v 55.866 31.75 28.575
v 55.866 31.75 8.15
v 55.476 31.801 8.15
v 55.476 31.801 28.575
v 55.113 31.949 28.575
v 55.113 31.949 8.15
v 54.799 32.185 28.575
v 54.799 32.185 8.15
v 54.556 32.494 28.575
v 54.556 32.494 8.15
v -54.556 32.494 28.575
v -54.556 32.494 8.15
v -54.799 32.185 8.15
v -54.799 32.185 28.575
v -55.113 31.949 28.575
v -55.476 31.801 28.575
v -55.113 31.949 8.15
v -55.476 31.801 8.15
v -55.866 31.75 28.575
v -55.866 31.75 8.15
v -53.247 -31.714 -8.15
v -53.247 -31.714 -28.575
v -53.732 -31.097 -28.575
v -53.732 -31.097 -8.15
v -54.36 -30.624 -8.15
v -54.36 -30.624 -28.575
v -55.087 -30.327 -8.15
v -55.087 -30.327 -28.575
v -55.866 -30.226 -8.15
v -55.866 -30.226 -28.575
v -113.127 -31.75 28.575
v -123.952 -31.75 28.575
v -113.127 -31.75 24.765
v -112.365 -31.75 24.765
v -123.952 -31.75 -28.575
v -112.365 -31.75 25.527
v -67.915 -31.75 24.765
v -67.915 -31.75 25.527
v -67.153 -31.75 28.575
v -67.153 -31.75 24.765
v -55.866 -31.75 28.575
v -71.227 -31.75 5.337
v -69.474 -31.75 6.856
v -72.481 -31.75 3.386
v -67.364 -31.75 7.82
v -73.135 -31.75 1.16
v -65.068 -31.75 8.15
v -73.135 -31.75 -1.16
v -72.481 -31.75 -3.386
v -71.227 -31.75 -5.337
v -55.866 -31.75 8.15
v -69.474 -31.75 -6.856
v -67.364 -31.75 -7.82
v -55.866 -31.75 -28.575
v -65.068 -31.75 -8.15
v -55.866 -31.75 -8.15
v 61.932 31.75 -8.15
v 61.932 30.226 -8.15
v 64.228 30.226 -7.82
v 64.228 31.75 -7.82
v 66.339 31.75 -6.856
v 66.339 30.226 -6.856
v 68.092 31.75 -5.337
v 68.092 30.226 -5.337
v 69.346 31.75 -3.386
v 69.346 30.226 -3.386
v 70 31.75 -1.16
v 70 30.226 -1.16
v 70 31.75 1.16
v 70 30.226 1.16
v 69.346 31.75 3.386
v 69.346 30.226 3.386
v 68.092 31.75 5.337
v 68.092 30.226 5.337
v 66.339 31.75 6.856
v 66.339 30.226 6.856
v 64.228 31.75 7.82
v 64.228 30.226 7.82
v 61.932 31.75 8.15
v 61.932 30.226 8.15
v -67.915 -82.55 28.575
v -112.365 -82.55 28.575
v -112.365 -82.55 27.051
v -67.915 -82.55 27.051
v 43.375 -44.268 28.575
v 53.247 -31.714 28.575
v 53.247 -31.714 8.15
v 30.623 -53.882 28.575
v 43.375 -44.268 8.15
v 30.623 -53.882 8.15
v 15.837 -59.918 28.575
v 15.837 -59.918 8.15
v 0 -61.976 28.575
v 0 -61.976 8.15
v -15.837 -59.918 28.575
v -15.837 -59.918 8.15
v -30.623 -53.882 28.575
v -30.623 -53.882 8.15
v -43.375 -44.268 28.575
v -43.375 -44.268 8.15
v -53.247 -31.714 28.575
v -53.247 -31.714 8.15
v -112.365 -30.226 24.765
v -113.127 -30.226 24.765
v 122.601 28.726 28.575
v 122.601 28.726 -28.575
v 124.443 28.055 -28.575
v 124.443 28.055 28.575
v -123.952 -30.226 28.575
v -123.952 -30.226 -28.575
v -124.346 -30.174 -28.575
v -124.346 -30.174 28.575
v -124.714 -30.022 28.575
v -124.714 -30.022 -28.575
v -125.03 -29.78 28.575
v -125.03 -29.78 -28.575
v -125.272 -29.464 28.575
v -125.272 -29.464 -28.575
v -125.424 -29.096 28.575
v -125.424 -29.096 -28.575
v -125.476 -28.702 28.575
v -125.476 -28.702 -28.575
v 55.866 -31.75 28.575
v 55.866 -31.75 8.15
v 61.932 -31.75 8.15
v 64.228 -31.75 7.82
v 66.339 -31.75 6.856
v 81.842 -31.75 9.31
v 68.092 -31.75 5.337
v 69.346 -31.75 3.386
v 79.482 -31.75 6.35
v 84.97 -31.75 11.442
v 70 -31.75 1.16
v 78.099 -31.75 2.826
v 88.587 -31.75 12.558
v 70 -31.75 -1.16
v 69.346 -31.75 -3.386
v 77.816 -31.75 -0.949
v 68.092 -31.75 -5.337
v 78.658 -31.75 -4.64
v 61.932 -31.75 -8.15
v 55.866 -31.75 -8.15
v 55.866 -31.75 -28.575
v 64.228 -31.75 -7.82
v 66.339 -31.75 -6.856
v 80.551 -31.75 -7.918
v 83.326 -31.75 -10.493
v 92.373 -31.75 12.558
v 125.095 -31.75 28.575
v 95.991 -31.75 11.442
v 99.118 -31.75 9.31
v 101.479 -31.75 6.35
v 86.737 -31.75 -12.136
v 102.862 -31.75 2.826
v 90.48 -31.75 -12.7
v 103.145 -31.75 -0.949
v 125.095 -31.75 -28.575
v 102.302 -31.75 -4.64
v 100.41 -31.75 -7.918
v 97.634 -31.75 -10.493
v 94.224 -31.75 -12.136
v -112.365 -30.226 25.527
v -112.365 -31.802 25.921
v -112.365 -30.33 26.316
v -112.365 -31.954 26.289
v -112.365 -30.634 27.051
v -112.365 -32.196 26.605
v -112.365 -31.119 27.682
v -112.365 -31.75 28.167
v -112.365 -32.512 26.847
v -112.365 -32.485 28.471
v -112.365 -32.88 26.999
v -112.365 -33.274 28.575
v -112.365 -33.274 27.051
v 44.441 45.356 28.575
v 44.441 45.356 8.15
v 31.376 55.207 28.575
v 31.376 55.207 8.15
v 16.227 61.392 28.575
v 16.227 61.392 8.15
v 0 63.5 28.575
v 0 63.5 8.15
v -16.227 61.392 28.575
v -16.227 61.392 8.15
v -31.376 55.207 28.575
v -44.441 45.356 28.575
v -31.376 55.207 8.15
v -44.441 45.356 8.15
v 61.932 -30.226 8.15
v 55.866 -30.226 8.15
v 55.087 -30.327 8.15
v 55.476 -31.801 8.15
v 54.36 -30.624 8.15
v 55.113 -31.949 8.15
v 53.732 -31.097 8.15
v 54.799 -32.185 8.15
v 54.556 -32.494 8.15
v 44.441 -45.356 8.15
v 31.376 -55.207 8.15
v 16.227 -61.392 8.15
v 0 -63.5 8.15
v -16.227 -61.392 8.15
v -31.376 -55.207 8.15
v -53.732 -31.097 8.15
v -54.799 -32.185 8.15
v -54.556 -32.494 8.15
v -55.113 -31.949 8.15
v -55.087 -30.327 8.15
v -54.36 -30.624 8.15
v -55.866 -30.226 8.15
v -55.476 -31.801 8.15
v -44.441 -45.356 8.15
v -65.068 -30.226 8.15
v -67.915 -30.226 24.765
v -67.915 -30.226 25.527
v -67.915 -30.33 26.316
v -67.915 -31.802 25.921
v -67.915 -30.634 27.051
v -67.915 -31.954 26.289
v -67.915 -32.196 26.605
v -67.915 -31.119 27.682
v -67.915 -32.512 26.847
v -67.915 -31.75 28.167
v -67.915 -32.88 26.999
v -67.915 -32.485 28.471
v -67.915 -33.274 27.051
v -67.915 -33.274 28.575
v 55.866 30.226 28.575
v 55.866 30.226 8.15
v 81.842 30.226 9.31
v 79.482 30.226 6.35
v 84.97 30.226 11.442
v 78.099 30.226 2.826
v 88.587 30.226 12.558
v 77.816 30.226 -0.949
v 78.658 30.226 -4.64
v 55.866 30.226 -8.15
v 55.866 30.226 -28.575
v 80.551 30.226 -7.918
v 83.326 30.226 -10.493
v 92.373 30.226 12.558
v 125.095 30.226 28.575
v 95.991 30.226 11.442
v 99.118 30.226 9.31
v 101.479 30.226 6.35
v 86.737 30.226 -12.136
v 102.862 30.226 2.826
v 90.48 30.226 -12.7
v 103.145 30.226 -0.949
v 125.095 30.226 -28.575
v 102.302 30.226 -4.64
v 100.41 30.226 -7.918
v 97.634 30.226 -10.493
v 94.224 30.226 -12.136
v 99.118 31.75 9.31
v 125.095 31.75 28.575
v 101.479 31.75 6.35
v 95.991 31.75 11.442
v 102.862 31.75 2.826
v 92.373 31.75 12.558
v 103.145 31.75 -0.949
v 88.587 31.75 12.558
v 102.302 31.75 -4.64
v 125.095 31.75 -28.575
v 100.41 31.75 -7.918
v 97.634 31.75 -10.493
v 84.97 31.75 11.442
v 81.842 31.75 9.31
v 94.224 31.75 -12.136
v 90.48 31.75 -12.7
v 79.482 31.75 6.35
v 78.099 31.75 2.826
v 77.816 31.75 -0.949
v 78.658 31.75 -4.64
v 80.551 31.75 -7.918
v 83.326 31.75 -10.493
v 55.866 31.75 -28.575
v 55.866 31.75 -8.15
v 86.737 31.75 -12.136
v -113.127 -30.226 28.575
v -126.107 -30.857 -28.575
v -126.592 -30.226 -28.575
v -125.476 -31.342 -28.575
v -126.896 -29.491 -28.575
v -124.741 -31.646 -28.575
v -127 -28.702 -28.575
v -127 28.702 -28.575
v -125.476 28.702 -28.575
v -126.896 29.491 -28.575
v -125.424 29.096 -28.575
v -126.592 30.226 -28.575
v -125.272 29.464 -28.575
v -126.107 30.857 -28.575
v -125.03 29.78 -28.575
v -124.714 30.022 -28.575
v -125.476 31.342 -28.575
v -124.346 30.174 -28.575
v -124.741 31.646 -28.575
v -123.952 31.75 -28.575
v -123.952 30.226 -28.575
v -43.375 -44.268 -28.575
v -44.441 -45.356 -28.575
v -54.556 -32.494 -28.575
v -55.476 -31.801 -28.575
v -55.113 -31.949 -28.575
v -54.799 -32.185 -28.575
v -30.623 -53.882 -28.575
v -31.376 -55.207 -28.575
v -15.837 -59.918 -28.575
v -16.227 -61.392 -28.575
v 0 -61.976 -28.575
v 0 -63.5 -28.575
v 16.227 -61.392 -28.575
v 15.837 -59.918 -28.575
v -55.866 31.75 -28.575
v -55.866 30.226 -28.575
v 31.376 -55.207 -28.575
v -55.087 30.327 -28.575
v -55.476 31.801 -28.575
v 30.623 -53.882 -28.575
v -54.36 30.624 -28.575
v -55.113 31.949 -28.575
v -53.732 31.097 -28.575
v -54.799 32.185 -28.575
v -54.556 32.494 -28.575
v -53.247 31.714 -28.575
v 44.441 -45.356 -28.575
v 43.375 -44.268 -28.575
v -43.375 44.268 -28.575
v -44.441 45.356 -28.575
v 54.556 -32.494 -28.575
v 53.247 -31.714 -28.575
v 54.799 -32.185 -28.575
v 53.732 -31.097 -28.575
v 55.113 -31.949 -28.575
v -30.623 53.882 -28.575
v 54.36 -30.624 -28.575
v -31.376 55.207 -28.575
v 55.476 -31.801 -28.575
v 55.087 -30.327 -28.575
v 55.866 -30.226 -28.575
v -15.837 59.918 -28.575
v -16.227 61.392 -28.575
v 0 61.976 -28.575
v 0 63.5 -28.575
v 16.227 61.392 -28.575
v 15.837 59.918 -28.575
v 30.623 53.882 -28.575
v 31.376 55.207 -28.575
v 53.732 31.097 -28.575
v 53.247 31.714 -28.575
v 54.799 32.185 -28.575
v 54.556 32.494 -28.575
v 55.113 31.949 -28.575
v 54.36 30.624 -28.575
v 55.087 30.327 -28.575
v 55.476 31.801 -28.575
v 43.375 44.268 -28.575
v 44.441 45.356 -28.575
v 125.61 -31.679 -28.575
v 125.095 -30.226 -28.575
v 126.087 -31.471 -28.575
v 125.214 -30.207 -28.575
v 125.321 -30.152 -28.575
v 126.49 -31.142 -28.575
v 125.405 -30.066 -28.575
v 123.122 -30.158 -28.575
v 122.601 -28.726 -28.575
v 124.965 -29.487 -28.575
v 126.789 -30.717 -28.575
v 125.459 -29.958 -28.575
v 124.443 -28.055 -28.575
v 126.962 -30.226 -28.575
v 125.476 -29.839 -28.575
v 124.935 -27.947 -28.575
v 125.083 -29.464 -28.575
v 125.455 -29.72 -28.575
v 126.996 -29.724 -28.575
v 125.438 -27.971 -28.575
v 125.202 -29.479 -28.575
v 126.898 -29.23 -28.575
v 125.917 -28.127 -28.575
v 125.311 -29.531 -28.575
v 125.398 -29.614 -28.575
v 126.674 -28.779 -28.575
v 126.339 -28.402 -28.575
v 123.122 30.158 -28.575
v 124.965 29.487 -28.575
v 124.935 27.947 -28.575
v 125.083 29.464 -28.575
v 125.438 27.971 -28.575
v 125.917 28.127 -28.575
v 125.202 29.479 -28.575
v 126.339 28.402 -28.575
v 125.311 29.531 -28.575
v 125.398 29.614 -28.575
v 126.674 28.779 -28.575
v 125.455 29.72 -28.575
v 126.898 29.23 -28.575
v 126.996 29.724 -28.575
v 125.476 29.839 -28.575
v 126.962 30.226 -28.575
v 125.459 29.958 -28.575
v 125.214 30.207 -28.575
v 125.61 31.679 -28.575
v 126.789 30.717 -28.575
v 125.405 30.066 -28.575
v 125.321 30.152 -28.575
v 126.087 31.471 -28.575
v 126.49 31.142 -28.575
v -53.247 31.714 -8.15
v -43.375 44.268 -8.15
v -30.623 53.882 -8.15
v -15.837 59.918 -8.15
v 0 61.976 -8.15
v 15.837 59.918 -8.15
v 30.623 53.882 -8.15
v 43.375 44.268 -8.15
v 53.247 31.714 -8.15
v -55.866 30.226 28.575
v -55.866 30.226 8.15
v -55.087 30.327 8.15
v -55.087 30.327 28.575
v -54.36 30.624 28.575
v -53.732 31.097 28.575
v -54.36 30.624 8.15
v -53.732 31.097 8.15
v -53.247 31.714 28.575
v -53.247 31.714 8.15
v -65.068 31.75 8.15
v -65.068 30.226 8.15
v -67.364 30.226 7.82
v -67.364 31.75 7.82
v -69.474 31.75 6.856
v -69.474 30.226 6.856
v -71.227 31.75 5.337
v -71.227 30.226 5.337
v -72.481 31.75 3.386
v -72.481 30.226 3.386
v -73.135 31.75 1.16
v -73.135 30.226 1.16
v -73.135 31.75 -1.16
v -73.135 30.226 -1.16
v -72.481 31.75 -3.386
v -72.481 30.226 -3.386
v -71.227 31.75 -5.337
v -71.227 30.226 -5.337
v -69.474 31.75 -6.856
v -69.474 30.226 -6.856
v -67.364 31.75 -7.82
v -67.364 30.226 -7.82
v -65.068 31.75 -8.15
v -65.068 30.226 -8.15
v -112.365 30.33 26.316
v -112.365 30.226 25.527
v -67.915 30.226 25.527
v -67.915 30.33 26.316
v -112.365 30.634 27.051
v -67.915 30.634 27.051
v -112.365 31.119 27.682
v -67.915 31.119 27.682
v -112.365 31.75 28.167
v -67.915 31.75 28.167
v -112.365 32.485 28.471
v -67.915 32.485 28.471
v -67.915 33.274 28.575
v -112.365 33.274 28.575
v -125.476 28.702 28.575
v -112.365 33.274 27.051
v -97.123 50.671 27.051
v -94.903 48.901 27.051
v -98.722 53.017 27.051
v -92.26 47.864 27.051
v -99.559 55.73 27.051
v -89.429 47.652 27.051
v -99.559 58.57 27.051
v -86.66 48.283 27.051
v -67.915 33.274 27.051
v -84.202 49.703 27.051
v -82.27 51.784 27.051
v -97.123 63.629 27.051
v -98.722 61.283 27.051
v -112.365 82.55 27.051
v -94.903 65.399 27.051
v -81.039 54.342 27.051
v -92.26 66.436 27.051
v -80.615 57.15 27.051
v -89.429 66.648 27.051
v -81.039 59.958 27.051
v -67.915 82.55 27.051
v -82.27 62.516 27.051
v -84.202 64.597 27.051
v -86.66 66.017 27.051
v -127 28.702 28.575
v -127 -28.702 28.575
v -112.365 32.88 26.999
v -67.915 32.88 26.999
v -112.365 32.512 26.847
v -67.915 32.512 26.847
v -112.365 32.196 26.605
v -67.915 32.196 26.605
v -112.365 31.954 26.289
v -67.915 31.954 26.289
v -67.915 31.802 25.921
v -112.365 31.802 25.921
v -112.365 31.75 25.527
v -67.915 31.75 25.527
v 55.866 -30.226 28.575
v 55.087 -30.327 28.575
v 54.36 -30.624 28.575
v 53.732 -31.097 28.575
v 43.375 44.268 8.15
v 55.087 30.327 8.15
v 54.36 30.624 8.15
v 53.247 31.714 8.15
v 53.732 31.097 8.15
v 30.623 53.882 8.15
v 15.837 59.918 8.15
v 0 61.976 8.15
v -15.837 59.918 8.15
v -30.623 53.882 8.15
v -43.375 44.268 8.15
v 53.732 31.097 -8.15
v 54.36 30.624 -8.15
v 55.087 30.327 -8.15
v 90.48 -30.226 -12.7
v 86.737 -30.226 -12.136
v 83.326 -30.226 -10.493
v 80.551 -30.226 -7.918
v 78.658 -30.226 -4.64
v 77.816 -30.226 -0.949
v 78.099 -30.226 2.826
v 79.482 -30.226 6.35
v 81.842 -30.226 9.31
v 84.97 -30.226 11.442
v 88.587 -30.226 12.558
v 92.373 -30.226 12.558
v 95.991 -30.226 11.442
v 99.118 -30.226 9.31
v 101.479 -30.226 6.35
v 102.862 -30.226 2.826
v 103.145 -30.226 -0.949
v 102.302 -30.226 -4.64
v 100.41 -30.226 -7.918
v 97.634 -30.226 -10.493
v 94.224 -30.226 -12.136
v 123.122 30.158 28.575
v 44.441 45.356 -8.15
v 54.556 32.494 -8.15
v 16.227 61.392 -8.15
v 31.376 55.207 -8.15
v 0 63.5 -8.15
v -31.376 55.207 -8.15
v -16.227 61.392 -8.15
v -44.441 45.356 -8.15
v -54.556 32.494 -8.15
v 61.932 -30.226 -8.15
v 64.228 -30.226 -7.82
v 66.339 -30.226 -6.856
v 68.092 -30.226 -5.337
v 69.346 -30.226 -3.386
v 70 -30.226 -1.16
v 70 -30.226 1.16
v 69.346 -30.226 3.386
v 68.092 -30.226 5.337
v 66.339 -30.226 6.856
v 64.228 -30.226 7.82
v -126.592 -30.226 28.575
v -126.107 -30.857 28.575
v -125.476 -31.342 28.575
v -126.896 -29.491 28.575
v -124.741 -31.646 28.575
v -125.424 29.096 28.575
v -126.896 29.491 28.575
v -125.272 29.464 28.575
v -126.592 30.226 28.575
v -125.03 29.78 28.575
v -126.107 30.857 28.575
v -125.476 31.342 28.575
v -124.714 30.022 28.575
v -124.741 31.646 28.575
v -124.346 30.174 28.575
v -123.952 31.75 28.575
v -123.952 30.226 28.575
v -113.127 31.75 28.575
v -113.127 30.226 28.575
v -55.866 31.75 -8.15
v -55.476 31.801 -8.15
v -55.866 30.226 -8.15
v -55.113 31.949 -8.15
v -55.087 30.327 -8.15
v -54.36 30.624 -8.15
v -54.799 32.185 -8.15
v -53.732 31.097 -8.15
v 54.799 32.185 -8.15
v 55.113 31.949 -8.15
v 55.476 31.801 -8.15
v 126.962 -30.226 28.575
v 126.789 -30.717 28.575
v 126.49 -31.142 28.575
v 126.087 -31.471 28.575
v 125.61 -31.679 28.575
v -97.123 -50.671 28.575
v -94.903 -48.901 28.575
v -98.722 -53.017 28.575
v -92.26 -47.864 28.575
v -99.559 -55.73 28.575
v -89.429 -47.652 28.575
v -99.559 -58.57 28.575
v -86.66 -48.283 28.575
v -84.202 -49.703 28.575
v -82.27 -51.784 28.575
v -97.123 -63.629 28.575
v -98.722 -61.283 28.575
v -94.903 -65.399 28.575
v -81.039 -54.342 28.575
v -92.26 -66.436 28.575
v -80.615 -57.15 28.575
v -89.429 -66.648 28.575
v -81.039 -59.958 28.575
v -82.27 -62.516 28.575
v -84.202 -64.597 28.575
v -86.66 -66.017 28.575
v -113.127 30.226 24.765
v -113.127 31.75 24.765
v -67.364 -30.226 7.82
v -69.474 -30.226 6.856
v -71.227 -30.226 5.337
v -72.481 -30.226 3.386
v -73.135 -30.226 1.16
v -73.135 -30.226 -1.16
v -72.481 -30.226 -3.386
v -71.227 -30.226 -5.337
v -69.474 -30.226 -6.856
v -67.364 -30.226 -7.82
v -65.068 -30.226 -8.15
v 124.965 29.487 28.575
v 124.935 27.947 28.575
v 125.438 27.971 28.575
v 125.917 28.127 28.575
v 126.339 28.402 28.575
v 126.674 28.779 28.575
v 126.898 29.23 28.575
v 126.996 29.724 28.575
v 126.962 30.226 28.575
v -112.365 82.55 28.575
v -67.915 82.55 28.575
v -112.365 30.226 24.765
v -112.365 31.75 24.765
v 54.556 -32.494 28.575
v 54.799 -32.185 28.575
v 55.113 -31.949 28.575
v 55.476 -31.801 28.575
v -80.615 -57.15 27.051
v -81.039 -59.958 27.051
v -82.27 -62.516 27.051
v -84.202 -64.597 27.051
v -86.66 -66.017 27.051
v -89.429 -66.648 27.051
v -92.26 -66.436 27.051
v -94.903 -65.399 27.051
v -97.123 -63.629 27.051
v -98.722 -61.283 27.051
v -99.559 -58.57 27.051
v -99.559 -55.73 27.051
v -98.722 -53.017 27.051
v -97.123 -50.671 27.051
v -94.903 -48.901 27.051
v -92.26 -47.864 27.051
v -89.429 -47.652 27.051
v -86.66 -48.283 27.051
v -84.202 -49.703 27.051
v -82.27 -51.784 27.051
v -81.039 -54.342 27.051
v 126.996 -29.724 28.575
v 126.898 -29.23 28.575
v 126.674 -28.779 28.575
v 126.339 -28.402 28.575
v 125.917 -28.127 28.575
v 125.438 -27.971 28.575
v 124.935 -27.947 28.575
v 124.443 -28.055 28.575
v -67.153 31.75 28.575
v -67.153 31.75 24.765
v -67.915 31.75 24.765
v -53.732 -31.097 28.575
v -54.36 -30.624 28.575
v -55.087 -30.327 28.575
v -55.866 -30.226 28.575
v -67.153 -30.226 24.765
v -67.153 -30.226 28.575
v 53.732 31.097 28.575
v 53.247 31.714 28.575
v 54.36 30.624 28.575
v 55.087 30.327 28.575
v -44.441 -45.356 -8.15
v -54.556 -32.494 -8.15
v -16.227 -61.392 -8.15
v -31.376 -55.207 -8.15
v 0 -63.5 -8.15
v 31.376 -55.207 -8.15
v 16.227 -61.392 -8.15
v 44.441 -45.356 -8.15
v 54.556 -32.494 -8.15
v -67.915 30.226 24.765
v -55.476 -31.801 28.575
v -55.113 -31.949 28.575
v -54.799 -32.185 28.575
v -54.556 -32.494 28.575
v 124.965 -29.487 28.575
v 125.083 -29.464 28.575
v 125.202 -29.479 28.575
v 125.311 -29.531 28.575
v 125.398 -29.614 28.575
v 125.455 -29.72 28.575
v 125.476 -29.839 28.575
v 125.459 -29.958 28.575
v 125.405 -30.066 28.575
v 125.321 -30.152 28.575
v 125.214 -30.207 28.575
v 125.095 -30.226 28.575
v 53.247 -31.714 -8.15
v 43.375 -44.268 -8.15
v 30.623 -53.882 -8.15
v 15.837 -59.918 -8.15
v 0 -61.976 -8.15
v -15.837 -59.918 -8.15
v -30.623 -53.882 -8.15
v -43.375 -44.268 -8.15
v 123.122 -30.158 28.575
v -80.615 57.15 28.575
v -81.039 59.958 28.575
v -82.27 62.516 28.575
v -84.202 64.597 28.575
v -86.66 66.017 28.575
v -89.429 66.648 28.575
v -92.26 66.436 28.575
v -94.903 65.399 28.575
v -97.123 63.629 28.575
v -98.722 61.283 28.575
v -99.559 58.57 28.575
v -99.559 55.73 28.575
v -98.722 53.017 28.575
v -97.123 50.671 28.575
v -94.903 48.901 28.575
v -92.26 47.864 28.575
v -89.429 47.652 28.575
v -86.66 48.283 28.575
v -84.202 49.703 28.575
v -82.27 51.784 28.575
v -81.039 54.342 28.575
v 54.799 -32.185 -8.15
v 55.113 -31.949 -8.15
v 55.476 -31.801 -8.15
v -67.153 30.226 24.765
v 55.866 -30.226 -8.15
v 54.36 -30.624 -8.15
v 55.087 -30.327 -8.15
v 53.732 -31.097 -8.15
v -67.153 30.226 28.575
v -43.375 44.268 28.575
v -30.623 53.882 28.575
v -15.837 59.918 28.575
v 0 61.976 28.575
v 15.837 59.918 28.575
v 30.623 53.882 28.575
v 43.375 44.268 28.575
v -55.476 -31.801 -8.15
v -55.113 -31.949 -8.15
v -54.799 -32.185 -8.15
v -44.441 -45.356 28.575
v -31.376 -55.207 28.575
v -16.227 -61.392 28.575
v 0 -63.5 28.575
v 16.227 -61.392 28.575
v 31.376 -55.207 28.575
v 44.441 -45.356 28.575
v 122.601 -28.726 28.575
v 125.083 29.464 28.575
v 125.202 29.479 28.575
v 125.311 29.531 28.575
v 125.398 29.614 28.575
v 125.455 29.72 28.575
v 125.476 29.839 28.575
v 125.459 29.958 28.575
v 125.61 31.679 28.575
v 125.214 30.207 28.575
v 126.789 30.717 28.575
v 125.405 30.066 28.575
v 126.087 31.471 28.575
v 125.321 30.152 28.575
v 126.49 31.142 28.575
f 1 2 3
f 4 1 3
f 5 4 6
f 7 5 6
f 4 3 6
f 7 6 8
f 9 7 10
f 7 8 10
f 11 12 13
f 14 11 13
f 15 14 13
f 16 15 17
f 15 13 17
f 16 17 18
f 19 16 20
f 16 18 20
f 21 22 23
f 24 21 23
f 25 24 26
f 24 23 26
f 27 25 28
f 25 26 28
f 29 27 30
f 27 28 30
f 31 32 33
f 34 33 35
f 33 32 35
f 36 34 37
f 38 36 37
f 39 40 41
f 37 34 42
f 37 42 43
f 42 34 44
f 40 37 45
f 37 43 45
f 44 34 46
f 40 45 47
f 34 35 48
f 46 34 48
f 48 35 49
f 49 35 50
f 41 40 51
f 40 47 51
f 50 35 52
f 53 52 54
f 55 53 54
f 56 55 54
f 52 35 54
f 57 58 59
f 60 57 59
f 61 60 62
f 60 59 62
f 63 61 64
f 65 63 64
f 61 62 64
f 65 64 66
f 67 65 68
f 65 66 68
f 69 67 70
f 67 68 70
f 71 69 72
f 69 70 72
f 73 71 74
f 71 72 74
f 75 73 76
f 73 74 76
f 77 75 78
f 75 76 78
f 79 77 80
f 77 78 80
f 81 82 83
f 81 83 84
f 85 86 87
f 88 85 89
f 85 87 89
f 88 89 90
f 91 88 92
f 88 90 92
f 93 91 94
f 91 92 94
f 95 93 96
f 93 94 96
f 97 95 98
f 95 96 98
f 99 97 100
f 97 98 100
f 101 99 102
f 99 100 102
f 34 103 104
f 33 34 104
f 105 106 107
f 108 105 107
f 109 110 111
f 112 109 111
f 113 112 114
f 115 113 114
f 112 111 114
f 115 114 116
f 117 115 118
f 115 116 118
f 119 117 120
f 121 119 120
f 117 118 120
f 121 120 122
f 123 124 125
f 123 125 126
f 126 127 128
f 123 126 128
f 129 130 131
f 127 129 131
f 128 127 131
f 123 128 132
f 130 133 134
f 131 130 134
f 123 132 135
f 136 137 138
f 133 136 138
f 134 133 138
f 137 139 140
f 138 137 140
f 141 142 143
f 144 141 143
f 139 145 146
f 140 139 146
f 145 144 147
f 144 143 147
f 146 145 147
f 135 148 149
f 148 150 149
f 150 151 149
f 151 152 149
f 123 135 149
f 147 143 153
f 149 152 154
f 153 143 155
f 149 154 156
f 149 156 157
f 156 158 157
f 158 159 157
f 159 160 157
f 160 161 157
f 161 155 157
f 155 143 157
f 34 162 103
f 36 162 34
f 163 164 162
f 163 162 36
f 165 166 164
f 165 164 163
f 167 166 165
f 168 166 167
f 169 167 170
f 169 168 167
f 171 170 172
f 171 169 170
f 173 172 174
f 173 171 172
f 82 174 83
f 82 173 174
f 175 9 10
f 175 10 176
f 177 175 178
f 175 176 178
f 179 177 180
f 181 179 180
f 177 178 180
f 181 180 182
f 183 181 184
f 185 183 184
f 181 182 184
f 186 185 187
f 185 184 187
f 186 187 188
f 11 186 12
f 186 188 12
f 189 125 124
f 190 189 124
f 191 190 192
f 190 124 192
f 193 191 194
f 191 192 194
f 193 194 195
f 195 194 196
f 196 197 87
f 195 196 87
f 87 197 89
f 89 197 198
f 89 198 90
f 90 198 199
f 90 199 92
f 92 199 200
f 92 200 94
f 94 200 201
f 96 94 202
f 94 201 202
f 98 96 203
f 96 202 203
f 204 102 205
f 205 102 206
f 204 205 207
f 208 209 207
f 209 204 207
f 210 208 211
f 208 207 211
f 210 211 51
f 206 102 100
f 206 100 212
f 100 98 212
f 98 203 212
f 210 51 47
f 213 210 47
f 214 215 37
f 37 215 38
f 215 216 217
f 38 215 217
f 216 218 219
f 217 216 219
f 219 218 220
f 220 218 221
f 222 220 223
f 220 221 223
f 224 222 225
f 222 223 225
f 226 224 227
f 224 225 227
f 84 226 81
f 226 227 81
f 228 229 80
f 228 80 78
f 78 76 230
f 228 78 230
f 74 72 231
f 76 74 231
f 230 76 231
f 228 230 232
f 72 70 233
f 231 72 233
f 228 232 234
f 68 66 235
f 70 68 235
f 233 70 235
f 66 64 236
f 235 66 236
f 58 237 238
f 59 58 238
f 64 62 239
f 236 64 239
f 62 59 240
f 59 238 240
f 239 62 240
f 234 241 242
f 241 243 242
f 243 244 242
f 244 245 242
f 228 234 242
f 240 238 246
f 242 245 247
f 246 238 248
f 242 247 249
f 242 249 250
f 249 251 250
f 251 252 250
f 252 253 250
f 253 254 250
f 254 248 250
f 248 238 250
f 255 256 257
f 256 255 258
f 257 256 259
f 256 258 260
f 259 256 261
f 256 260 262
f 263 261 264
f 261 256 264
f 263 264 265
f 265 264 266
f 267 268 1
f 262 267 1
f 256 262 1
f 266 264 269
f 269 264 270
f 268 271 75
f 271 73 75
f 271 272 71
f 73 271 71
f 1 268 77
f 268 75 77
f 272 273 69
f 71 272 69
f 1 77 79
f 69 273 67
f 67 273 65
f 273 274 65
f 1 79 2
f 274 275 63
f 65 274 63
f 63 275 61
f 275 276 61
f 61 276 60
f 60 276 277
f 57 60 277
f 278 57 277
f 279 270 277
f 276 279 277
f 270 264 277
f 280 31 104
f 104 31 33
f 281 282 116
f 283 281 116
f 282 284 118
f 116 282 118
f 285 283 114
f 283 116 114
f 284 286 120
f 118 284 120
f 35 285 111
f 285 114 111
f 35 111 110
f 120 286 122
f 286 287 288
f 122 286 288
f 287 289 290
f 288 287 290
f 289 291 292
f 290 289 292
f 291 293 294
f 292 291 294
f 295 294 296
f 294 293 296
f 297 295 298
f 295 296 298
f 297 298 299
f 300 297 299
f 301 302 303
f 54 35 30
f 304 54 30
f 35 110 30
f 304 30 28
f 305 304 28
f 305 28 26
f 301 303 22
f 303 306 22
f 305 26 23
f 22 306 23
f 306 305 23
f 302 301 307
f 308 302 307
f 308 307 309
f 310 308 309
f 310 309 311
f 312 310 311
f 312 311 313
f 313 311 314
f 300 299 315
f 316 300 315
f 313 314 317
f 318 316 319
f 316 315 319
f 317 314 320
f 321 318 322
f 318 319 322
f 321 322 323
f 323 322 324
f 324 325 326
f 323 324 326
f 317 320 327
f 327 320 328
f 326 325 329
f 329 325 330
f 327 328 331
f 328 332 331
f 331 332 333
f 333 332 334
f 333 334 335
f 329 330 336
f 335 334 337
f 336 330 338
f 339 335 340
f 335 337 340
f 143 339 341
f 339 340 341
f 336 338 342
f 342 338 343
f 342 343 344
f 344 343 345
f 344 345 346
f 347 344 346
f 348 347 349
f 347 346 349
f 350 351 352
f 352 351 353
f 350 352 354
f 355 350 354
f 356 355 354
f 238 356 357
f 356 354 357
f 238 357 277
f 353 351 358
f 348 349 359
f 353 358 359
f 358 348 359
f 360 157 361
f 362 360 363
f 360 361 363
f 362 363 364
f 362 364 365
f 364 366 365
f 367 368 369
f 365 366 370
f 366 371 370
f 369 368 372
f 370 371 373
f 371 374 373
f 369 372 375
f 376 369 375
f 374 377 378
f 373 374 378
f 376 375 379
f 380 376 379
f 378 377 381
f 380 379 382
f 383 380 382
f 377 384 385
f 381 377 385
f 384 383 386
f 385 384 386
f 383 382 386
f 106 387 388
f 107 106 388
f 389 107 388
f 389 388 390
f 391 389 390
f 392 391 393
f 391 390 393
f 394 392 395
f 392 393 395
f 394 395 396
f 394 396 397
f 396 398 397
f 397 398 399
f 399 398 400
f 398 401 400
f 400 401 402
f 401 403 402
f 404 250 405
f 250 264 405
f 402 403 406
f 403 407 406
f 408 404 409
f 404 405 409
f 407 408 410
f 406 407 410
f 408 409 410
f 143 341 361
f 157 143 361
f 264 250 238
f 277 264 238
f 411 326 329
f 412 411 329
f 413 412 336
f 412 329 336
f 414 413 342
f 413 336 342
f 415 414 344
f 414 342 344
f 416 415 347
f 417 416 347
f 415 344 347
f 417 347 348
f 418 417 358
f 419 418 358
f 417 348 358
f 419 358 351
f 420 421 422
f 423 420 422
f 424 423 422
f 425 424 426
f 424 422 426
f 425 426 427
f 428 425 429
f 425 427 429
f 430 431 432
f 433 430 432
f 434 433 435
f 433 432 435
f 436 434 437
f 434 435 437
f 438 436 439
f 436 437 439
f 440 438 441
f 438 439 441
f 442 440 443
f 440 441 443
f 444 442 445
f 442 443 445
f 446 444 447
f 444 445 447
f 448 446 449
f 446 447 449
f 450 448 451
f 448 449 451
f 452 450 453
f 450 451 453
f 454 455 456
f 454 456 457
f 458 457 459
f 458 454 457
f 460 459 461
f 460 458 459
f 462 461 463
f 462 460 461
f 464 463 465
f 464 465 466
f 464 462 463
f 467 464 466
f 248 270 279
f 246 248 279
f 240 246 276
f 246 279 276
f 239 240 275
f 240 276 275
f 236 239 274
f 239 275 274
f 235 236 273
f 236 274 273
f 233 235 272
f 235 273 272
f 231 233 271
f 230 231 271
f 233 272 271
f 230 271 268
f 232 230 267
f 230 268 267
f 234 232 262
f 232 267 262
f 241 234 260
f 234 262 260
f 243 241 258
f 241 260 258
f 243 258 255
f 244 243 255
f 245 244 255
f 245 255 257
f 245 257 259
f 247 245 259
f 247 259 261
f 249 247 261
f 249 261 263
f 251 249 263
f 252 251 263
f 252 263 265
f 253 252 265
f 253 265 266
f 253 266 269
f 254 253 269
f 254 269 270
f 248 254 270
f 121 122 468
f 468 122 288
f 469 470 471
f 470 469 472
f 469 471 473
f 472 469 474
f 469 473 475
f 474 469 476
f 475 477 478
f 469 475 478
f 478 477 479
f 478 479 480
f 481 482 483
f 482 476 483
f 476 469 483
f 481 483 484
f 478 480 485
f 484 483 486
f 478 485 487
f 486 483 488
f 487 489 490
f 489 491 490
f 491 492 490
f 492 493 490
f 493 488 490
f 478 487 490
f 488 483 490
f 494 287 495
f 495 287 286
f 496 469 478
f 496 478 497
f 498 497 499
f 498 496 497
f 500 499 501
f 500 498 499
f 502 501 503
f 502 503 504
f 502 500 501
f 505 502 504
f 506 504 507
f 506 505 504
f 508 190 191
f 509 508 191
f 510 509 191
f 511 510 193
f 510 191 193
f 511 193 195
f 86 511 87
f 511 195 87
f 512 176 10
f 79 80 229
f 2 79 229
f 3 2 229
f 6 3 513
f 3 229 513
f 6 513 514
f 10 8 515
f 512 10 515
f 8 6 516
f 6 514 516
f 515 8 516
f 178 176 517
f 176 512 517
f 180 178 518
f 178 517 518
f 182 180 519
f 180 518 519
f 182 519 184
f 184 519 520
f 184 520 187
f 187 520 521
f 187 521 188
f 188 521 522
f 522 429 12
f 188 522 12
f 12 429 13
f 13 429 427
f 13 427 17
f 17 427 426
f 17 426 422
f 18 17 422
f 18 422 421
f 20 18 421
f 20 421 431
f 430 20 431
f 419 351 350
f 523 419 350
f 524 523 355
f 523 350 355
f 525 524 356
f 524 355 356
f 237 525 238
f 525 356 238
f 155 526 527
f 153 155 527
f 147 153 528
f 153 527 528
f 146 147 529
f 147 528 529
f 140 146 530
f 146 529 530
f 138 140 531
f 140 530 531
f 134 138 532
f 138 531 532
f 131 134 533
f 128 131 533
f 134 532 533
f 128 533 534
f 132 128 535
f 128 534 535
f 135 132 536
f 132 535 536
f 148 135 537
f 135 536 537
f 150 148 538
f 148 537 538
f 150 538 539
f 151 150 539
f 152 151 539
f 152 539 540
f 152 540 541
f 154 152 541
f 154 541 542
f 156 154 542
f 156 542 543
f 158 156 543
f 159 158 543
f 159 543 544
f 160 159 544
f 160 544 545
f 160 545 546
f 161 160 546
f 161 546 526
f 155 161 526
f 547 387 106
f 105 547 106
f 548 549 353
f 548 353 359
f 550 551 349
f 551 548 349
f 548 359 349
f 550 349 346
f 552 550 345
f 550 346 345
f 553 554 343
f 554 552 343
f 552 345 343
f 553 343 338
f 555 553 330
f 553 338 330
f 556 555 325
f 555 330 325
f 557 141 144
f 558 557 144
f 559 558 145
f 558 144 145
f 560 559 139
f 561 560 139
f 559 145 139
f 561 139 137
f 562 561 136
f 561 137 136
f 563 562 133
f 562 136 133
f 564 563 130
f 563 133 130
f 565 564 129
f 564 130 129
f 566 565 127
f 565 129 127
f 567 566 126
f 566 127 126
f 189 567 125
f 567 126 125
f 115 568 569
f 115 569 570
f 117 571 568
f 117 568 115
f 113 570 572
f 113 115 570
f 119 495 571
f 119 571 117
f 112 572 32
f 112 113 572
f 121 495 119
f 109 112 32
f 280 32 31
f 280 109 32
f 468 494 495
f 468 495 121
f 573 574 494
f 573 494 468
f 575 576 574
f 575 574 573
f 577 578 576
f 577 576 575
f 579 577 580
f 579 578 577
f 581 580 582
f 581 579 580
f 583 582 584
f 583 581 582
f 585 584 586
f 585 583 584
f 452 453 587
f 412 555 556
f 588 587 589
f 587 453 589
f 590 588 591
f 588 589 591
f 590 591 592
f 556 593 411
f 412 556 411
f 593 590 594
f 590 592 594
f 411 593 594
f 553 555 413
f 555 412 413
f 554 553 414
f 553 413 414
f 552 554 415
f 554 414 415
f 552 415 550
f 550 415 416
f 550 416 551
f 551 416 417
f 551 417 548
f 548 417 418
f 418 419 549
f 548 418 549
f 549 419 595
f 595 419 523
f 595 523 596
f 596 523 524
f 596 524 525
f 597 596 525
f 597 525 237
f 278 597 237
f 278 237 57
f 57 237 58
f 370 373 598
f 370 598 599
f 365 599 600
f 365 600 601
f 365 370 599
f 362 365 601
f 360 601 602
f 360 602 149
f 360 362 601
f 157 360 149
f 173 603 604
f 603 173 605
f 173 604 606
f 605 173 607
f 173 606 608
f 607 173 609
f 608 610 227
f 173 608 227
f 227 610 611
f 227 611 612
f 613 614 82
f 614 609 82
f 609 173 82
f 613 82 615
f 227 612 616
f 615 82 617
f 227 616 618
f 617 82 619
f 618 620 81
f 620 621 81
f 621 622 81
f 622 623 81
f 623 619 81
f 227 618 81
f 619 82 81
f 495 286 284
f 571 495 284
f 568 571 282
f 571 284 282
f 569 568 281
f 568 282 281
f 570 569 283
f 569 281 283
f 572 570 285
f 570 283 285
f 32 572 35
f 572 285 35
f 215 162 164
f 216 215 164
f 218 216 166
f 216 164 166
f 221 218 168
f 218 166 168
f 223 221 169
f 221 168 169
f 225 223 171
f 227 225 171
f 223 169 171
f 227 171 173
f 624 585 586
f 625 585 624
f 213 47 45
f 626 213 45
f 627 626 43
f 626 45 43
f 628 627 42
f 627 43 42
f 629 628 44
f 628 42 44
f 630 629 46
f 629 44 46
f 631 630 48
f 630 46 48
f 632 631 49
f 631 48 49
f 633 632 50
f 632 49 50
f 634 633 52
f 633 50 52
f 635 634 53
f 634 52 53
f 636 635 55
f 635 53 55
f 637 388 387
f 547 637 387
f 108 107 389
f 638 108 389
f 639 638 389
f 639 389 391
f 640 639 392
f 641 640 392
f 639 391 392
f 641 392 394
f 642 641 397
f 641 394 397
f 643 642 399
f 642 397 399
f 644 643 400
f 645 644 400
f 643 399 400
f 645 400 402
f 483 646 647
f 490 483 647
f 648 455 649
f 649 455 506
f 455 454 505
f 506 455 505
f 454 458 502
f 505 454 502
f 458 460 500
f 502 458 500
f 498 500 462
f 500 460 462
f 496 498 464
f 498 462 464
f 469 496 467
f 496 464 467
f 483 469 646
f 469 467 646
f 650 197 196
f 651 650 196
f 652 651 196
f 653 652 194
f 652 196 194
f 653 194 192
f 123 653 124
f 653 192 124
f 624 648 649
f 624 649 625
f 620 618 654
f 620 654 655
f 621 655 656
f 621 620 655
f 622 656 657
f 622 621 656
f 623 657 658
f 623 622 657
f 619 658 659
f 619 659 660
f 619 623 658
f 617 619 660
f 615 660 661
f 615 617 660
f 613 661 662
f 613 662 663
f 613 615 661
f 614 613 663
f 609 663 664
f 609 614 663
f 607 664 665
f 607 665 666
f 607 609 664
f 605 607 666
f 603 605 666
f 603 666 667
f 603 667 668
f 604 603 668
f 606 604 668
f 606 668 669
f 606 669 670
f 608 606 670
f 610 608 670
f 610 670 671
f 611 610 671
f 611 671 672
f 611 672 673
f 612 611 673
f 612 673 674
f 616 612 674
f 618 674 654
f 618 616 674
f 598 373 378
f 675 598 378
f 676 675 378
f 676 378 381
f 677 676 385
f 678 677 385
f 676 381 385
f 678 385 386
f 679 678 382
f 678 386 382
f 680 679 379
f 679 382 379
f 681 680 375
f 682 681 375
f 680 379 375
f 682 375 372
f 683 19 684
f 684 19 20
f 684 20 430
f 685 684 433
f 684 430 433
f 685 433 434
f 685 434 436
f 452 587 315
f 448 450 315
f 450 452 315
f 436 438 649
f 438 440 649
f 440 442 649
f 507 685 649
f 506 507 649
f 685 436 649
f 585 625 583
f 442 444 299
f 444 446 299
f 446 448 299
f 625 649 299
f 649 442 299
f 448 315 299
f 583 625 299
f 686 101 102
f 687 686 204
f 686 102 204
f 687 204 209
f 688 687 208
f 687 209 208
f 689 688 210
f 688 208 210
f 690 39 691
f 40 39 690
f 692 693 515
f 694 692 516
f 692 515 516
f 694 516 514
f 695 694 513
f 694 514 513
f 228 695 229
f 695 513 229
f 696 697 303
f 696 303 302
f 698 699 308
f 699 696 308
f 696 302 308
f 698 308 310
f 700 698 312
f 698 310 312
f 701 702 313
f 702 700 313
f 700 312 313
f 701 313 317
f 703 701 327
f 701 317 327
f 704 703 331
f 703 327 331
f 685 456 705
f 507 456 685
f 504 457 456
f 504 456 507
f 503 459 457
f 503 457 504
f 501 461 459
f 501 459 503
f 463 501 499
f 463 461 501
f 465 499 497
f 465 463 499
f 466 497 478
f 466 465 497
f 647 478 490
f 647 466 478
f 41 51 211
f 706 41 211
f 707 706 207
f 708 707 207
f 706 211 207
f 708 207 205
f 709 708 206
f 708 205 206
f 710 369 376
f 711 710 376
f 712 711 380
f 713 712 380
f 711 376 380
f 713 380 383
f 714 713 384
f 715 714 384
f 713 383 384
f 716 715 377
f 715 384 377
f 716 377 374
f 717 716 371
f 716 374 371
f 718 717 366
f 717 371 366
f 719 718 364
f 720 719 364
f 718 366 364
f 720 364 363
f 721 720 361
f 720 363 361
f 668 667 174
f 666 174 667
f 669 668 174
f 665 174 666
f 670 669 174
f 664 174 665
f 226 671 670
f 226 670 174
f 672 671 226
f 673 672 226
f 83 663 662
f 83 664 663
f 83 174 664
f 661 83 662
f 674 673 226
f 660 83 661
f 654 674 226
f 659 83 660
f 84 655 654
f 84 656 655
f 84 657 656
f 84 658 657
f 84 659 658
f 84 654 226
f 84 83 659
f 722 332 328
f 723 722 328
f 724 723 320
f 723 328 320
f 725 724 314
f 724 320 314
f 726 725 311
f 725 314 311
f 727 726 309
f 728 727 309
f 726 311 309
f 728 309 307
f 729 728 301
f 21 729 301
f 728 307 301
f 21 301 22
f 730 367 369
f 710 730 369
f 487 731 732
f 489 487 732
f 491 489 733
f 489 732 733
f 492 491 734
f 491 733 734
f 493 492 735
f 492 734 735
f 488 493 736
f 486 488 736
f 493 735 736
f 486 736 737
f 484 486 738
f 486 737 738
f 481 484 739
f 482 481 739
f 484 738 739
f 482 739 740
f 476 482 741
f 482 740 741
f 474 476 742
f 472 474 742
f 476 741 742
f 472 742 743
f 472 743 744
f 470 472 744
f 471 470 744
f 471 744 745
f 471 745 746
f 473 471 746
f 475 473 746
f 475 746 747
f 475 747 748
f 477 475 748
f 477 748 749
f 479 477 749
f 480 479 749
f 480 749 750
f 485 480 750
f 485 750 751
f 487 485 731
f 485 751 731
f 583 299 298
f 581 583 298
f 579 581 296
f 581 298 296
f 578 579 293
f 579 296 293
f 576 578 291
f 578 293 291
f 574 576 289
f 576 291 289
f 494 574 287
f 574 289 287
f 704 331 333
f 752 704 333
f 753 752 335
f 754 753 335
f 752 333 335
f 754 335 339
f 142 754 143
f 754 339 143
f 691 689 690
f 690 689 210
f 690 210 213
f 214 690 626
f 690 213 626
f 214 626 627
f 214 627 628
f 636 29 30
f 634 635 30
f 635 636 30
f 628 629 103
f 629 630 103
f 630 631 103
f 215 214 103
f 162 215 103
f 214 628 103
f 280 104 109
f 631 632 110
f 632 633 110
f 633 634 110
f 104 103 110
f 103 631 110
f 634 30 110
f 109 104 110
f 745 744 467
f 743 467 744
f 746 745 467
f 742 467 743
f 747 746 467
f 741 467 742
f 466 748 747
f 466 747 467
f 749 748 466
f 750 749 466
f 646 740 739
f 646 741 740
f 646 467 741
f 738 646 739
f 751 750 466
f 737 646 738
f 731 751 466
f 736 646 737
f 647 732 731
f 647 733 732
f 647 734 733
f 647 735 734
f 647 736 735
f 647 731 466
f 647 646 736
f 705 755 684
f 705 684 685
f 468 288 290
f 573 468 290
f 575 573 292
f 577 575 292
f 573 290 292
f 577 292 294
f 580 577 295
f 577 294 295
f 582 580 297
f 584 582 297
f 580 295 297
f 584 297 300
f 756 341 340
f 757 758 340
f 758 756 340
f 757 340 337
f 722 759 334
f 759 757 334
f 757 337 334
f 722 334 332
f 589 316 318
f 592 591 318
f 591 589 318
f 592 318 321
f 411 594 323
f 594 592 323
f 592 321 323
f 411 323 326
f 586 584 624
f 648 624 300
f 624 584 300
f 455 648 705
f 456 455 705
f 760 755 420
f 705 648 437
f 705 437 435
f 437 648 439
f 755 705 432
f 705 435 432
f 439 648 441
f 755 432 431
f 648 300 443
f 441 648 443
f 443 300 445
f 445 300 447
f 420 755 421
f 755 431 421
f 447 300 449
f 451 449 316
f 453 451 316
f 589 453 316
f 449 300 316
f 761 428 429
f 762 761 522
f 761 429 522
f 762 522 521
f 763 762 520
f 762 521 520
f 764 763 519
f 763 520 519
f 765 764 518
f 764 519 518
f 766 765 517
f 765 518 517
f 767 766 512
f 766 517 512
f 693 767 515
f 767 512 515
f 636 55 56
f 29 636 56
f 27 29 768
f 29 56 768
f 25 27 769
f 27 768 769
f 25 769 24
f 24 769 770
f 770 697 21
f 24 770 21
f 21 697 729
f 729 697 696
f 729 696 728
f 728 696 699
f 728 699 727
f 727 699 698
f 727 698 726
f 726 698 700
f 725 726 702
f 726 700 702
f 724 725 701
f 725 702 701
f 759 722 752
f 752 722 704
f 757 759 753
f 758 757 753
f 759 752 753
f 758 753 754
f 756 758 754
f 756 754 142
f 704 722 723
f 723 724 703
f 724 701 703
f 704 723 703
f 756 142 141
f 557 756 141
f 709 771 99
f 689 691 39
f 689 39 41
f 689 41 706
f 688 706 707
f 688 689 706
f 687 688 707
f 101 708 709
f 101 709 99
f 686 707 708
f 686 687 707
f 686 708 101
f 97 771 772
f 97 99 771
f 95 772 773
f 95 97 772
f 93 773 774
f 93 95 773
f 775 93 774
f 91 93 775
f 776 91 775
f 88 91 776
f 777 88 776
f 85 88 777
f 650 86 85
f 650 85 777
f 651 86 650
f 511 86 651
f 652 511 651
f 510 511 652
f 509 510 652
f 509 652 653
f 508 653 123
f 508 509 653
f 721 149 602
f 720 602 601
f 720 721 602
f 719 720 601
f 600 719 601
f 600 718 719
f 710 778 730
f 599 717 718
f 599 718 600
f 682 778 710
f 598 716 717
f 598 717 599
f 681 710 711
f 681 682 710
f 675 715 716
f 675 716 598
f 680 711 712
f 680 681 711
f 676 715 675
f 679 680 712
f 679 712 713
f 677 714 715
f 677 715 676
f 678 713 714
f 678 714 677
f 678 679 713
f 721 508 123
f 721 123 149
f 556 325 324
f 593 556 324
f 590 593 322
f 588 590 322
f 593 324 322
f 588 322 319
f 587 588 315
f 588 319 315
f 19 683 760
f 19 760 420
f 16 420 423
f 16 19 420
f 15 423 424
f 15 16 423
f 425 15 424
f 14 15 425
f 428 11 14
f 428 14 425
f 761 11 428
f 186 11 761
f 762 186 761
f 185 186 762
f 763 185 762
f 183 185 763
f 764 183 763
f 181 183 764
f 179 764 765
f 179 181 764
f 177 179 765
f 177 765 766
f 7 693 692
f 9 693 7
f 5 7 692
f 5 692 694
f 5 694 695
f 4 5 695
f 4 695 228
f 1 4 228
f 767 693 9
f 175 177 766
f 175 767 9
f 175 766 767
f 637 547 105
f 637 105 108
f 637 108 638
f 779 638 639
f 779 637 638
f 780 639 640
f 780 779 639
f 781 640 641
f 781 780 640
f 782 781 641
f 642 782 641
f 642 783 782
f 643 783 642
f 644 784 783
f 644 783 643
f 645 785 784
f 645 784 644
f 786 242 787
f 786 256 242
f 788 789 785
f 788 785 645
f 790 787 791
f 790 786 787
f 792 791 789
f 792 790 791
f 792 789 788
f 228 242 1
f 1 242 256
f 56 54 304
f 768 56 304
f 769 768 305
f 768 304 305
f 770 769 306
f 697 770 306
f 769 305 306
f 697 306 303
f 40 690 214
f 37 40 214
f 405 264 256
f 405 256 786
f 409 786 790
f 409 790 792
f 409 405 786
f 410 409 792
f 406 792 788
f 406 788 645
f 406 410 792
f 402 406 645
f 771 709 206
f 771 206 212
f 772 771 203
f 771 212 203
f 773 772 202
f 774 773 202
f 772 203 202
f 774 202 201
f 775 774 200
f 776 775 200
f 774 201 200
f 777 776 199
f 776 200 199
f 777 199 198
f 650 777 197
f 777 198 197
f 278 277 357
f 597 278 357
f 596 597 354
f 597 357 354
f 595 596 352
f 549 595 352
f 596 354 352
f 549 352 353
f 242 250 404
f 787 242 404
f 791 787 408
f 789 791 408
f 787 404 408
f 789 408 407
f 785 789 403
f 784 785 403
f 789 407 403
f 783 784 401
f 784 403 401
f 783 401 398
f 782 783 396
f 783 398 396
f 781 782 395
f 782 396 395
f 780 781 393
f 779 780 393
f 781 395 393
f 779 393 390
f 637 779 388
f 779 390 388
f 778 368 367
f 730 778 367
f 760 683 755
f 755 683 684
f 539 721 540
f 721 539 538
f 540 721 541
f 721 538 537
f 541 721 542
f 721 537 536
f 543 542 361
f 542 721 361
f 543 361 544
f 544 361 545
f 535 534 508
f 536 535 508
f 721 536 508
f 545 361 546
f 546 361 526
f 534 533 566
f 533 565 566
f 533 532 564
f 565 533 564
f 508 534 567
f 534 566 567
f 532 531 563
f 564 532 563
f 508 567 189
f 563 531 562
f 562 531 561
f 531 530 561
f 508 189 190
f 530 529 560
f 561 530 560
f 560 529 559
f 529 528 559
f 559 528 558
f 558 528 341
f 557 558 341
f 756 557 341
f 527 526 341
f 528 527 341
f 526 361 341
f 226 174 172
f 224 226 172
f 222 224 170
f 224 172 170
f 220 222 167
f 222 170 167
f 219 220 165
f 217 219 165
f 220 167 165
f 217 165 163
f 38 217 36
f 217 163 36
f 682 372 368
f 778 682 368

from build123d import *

# Parameters (mm, degrees)
BASE_FLANGE1_START            = -28.575
BASE_FLANGE1_DEPTH            = 57.15
EDGE_FLANGE2_STRIP_W          = 9.144
EDGE_FLANGE2_STRIP_H          = 1.524
EDGE_FLANGE2_STRIP_CUT_DEPTH  = 44.45
EDGE_FLANGE2_RELIEF_W         = 9.906
EDGE_FLANGE2_RELIEF_H         = 0.762
EDGE_FLANGE2_RELIEF_CUT_DEPTH = 1.524
EDGE_FLANGE2_DEPTH            = 44.45
EDGE_FLANGE2_PROFILE_W        = 44.45
EDGE_FLANGE2_PROFILE_H        = 49.276
EDGE_FLANGE2_PROFILE_R        = 9.525
EDGE_FLANGE2_FLAT_DEPTH       = 1.524
HEM1_START                    = -28.575
HEM1_DEPTH                    = 57.15
HEM1_2_DEPTH                  = 57.15
SKETCH22_R                    = 12.7
CUT_EXTRUDE1_DEPTH            = 174.234005394
CUT_EXTRUDE2_DEPTH            = 174.234005394
CUT_EXTRUDE2_DEPTH_BACK       = 174.234005394


with BuildPart() as part:
    # Base-Flange1: read off the stored shape, not the designer's step
    # Base-Flange1 outline → Base-Flange1 (new body)
    with BuildSketch(Plane.XY.offset(BASE_FLANGE1_START)):
        with BuildLine():
            Line((55.865566318, 30.226), (127, 30.226))
            Line((127, 30.226), (127, 31.75))
            Line((127, 31.75), (55.865566318, 31.75))
            ThreePointArc((55.865566318, 31.75), (55.11254895, 31.949031757), (54.556217107, 32.494140625))
            ThreePointArc((54.556217107, 32.494140625), (0, 63.5), (-54.556217107, 32.494140625))
            ThreePointArc((-54.556217107, 32.494140625), (-55.11254895, 31.949031757), (-55.865566318, 31.75))
            Line((-55.865566318, 31.75), (-123.952, 31.75))
            ThreePointArc((-123.952, 31.75), (-126.107261469, 30.857261469), (-127, 28.702))
            Line((-127, 28.702), (-127, -28.702))
            ThreePointArc((-127, -28.702), (-126.107261469, -30.857261469), (-123.952, -31.75))
            Line((-123.952, -31.75), (-55.865566318, -31.75))
            ThreePointArc((-55.865566318, -31.75), (-55.11254895, -31.949031757), (-54.556217107, -32.494140625))
            ThreePointArc((-54.556217107, -32.494140625), (0, -63.5), (54.556217107, -32.494140625))
            ThreePointArc((54.556217107, -32.494140625), (55.11254895, -31.949031757), (55.865566318, -31.75))
            Line((55.865566318, -31.75), (127, -31.75))
            Line((127, -31.75), (127, -30.226))
            Line((127, -30.226), (55.865566318, -30.226))
            ThreePointArc((55.865566318, -30.226), (54.359531582, -30.624063515), (53.246867897, -31.71428125))
            ThreePointArc((53.246867897, -31.71428125), (0, -61.976), (-53.246867897, -31.71428125))
            ThreePointArc((-53.246867897, -31.71428125), (-54.359531582, -30.624063515), (-55.865566318, -30.226))
            Line((-55.865566318, -30.226), (-123.952, -30.226))
            ThreePointArc((-123.952, -30.226), (-125.029630735, -29.779630735), (-125.476, -28.702))
            Line((-125.476, -28.702), (-125.476, 28.702))
            ThreePointArc((-125.476, 28.702), (-125.029630735, 29.779630735), (-123.952, 30.226))
            Line((-123.952, 30.226), (-55.865566318, 30.226))
            ThreePointArc((-55.865566318, 30.226), (-54.359531582, 30.624063515), (-53.246867897, 31.71428125))
            ThreePointArc((-53.246867897, 31.71428125), (0, 61.976), (53.246867897, 31.71428125))
            ThreePointArc((53.246867897, 31.71428125), (54.359531582, 30.624063515), (55.865566318, 30.226))
        make_face()
    extrude(amount=BASE_FLANGE1_DEPTH)

    # Edge-Flange2: sheet metal written as solids
    # Edge-Flange2 strip (on a plane across the edge) → Edge-Flange2 strip cut (cut)
    with BuildSketch(Plane(origin=(-112.365340231, 31.75, 28.575), x_dir=(0, 0, -1), z_dir=(1, 0, 0))):
        with Locations((-1.524, -0.762)):
            Rectangle(EDGE_FLANGE2_STRIP_W, EDGE_FLANGE2_STRIP_H)
    edge_flange2_strip_cut = extrude(amount=EDGE_FLANGE2_STRIP_CUT_DEPTH, mode=Mode.SUBTRACT)

    # Edge-Flange2 relief (on the sheet) → Edge-Flange2 relief cut (cut)
    with BuildSketch(Plane(origin=(-112.365340231, 31.75, 25.527), x_dir=(0, 0, -1), z_dir=(0, 1, 0))):
        with Locations((-4.191, 0.381)):
            Rectangle(EDGE_FLANGE2_RELIEF_W, EDGE_FLANGE2_RELIEF_H)
        with Locations((-4.191, -44.831)):
            Rectangle(EDGE_FLANGE2_RELIEF_W, EDGE_FLANGE2_RELIEF_H)
    edge_flange2_relief_cut = extrude(amount=-EDGE_FLANGE2_RELIEF_CUT_DEPTH, mode=Mode.SUBTRACT)

    # Edge-Flange2 bend section (on a plane across the edge) → Edge-Flange2 (add)
    with BuildSketch(Plane(origin=(-112.365340231, 31.75, 28.575), x_dir=(0, 0, -1), z_dir=(1, 0, 0))):
        with BuildLine():
            Line((0, 1.524), (1.524, 1.524))
            ThreePointArc((1.524, 1.524), (1.970369265, 0.446369265), (3.048, 0))
            Line((3.048, 0), (3.048, -1.524))
            ThreePointArc((3.048, -1.524), (0.892738531, -0.631261469), (0, 1.524))
        make_face()
    edge_flange2 = extrude(amount=EDGE_FLANGE2_DEPTH)

    # Edge-Flange2 profile (on flange) → Edge-Flange2 flat (add)
    with BuildSketch(Plane(origin=(0, 31.75, 28.575), x_dir=(1, 0, 0), z_dir=(0, 0, 1))):
        with Locations((-90.140340231, 26.162)):
            Rectangle(EDGE_FLANGE2_PROFILE_W, EDGE_FLANGE2_PROFILE_H)
        with Locations((-90.140340231, 25.4)):
            Circle(EDGE_FLANGE2_PROFILE_R, mode=Mode.SUBTRACT)
    edge_flange2_flat = extrude(amount=-EDGE_FLANGE2_FLAT_DEPTH)

    # Mirror1: Edge-Flange2 strip cut, Edge-Flange2 relief cut, Edge-Flange2, Edge-Flange2 flat across plane
    add(edge_flange2_strip_cut.mirror(Plane.ZX), mode=Mode.SUBTRACT)
    add(edge_flange2_relief_cut.mirror(Plane.ZX), mode=Mode.SUBTRACT)
    add(edge_flange2.mirror(Plane.ZX))
    add(edge_flange2_flat.mirror(Plane.ZX))

    # Hem1: read off the stored shape, not the designer's step
    # Hem1 outline → Hem1 (cut)
    with BuildSketch(Plane.XY.offset(HEM1_START)):
        with BuildLine():
            ThreePointArc((125.095, 31.75), (126.299827788, 31.320606655), (126.961511183, 30.226))
            Line((126.961511183, 30.226), (127, 30.226))
            Line((127, 30.226), (127, 31.75))
            Line((127, 31.75), (125.095, 31.75))
        make_face()
        with BuildLine():
            Line((127, -30.226), (126.961511183, -30.226))
            ThreePointArc((126.961511183, -30.226), (126.299827788, -31.320606655), (125.095, -31.75))
            Line((125.095, -31.75), (127, -31.75))
            Line((127, -31.75), (127, -30.226))
        make_face()
    extrude(amount=HEM1_DEPTH, mode=Mode.SUBTRACT)

    # Hem1 2 outline → Hem1 2 (add)
    with BuildSketch(Plane.XY.offset(HEM1_START)):
        with BuildLine():
            Line((123.122180151, 30.157595971), (122.600941452, 28.725504417))
            Line((122.600941452, 28.725504417), (124.443451627, 28.054885557))
            ThreePointArc((124.443451627, 28.054885557), (126.338972724, 28.402239846), (126.961511183, 30.226))
            Line((126.961511183, 30.226), (125.095, 30.226))
            ThreePointArc((125.095, 30.226), (125.470211754, 29.778840044), (124.964690325, 29.486977111))
            Line((124.964690325, 29.486977111), (123.122180151, 30.157595971))
        make_face()
        with BuildLine():
            Line((122.600941452, -28.725504417), (123.122180151, -30.157595971))
            Line((123.122180151, -30.157595971), (124.964690325, -29.486977111))
            ThreePointArc((124.964690325, -29.486977111), (125.470211754, -29.778840044), (125.095, -30.226))
            Line((125.095, -30.226), (126.961511183, -30.226))
            ThreePointArc((126.961511183, -30.226), (126.338972724, -28.402239846), (124.443451627, -28.054885557))
            Line((124.443451627, -28.054885557), (122.600941452, -28.725504417))
        make_face()
    extrude(amount=HEM1_2_DEPTH)

    # Sketch22 → Cut-Extrude1 (cut, through all)
    with BuildSketch(Plane(origin=(0, 31.75, 0), x_dir=(1, 0, 0), z_dir=(0, 1, 0))):
        with Locations(Location((90.480283159, 0, 0), (0, 0, 90))):
            Circle(SKETCH22_R)
    extrude(amount=-CUT_EXTRUDE1_DEPTH, mode=Mode.SUBTRACT)

    # Sketch23 → Cut-Extrude2 (cut, two sides: drawn at the far end of the back side and taken through both)
    with BuildSketch(Plane(origin=(0, 31.75, 0), x_dir=(1, 0, 0), z_dir=(0, 1, 0)).offset(-CUT_EXTRUDE2_DEPTH_BACK)):
        with BuildLine():
            Line((-65.067682155, 8.15016142), (61.932317845, 8.15016142))
            ThreePointArc((61.932317845, 8.15016142), (70.082479265, 0), (61.932317845, -8.15016142))
            Line((61.932317845, -8.15016142), (-65.067682155, -8.15016142))
            ThreePointArc((-65.067682155, -8.15016142), (-73.217843575, 0), (-65.067682155, 8.15016142))
        make_face()
    extrude(amount=CUT_EXTRUDE2_DEPTH + CUT_EXTRUDE2_DEPTH_BACK, mode=Mode.SUBTRACT)


solid = part.part
